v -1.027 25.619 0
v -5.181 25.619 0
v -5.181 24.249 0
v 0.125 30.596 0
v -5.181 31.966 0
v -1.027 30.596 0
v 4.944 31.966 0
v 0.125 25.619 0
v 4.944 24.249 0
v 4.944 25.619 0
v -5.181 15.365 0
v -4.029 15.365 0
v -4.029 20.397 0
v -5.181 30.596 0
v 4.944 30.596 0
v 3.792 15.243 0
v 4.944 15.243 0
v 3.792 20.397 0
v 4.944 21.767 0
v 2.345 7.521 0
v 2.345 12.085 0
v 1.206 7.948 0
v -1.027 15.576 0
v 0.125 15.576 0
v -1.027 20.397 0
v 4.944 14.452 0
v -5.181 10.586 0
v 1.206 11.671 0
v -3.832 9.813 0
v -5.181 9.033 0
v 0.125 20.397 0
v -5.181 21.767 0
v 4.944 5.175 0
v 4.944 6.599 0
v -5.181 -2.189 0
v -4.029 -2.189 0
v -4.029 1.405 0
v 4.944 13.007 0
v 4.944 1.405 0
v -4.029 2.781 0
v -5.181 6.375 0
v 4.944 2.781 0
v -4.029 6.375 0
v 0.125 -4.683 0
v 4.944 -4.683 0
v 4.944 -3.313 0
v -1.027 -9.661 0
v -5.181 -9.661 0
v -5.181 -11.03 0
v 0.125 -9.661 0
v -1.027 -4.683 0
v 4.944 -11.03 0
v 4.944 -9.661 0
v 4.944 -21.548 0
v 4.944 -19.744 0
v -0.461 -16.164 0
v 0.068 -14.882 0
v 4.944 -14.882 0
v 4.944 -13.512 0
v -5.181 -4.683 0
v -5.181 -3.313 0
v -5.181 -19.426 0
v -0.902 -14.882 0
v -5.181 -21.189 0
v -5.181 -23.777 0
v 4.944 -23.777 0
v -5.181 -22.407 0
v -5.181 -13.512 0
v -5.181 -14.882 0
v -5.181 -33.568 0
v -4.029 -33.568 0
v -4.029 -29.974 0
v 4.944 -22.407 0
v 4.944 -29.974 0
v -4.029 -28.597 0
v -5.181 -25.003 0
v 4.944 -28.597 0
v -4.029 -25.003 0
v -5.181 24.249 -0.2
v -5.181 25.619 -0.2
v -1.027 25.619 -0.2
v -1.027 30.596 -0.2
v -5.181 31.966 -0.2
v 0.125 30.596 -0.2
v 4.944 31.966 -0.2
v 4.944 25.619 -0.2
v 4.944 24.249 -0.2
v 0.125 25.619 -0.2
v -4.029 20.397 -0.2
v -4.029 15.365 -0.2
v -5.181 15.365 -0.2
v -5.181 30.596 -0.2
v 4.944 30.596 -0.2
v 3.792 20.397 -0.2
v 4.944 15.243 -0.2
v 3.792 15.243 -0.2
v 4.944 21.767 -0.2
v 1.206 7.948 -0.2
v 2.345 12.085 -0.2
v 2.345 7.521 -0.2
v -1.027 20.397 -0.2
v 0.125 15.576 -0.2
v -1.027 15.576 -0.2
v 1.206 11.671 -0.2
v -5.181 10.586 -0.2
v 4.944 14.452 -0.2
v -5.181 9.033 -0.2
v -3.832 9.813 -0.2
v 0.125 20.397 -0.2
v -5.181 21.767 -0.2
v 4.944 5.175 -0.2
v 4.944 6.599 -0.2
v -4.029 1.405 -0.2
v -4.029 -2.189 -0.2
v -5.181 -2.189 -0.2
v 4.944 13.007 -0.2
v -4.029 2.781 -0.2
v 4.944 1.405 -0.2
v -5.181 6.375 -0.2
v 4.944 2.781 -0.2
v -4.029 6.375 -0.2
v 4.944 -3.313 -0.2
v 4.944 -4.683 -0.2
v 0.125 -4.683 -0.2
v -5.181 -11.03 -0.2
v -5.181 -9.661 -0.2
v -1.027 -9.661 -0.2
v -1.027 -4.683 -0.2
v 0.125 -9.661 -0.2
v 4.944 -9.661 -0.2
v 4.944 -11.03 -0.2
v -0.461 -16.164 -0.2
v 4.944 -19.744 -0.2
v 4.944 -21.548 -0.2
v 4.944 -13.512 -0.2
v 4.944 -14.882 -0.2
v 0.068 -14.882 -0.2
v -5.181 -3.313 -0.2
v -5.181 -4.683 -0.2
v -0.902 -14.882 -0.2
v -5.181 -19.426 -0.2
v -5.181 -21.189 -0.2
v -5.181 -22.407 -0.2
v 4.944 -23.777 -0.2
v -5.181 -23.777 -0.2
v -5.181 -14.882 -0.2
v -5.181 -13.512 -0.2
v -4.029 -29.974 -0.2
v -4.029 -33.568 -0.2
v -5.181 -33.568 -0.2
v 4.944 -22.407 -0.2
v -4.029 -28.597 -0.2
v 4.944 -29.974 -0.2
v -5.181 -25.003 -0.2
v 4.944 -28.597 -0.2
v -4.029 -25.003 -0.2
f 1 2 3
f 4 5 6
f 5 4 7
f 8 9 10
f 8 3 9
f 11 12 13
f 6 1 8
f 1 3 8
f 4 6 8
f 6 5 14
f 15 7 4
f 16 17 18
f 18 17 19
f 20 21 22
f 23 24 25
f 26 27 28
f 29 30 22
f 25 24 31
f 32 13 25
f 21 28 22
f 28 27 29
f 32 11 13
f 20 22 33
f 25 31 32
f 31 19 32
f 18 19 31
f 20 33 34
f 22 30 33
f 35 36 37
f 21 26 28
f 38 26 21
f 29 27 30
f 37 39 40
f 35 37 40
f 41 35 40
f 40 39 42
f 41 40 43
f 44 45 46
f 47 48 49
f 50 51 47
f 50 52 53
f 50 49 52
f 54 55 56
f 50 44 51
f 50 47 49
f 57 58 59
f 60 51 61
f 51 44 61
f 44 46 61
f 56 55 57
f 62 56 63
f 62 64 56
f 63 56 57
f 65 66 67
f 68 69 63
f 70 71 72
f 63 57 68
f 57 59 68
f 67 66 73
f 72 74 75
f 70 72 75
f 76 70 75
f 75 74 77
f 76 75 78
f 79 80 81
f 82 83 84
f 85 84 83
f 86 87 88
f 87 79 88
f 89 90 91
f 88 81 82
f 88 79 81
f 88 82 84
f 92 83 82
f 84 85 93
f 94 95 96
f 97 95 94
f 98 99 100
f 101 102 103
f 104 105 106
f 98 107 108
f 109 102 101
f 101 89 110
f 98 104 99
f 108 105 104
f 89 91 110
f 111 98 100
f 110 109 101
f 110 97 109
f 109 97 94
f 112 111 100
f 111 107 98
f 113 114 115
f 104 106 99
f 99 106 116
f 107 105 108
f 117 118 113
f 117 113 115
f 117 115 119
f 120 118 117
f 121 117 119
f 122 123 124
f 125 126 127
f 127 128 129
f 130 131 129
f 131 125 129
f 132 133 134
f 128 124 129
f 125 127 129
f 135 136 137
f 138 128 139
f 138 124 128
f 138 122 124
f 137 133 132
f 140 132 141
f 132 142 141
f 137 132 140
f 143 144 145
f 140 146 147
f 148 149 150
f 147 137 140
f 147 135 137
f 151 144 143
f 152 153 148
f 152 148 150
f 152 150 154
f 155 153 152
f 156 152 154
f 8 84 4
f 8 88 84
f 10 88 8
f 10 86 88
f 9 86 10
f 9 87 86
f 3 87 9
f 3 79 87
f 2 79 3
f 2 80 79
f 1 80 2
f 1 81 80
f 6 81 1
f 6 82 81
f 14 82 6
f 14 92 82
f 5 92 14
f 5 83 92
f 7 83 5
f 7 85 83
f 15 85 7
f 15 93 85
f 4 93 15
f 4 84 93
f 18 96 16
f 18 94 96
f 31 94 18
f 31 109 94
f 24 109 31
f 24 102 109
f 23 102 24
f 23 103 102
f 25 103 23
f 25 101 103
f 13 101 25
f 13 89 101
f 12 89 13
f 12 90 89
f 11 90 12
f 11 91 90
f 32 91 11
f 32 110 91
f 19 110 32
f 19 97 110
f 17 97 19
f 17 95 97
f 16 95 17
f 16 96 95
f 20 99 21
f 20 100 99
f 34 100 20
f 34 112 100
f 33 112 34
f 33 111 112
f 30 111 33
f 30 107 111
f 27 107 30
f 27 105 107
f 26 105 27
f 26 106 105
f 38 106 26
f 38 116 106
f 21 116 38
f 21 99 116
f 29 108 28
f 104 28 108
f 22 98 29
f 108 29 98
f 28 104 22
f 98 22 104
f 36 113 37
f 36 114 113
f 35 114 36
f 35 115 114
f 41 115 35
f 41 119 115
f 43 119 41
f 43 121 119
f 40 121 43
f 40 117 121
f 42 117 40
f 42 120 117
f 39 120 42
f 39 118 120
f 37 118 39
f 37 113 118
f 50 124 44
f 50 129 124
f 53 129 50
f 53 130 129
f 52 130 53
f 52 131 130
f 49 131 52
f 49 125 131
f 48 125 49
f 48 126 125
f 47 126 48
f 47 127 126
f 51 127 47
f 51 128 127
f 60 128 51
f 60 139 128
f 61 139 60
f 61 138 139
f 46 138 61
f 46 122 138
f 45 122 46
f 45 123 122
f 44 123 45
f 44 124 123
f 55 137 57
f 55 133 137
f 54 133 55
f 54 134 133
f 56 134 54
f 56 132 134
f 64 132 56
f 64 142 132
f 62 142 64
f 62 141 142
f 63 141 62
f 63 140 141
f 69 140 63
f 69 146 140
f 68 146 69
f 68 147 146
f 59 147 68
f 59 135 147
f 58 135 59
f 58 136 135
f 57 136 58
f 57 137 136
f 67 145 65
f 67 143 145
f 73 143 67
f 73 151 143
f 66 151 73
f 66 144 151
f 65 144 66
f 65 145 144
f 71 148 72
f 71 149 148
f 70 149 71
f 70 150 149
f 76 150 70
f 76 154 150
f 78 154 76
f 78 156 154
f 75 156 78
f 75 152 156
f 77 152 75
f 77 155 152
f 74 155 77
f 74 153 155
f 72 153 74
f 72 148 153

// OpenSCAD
// Heathkit H8 Computer Enclosure - H8 Badge
// Copyright 2024 Craig Bladow
// Released under MIT license:
// Uses hilbert texture per:
// https://github.com/prusa3d/PrusaSlicer/issues/4455
// Status is testing, font and style and dimensions are TBD


letter_height = 0.2001; //Match layer height

module letter(letter,letter_height, size)
{

    // convexity is needed for correct preview
    // since characters can be highly concave
    linear_extrude(height=letter_height, convexity=4)
        text(letter, 
             size=size,//width*22/30,
             //font="Bitstream Vera Sans:style=Bold",
             //font="Liberation Sans:style=Bold",
             //font="Liberation Sans",
             //font="Liberation Sans:style=Italic",
            //font="DM Sans Medium:style=Bold",
            //font="DM Sans Medium:style=Italic",
            font="Rodeo58",
            //font="DM Sans Medium:",
             halign="center",
             valign="center");
}

module letter_font(letter,lfont, letter_height, size)
{

    // convexity is needed for correct preview
    // since characters can be highly concave
    linear_extrude(height=letter_height, convexity=4)
        text(letter, 
             size=size,//width*22/30,
            font=lfont,
             halign="center",
             valign="center");
}

module heathkit(name,calc,hhc,location)
{
        rotate([0,180,90]) letter("HEATHKIT",letter_height,10);
}



heathkit();
/*
difference()
{
    cube([20,20,4],center = true);
    translate([0,0,2])cube([16,16,4],center = true);
} */
